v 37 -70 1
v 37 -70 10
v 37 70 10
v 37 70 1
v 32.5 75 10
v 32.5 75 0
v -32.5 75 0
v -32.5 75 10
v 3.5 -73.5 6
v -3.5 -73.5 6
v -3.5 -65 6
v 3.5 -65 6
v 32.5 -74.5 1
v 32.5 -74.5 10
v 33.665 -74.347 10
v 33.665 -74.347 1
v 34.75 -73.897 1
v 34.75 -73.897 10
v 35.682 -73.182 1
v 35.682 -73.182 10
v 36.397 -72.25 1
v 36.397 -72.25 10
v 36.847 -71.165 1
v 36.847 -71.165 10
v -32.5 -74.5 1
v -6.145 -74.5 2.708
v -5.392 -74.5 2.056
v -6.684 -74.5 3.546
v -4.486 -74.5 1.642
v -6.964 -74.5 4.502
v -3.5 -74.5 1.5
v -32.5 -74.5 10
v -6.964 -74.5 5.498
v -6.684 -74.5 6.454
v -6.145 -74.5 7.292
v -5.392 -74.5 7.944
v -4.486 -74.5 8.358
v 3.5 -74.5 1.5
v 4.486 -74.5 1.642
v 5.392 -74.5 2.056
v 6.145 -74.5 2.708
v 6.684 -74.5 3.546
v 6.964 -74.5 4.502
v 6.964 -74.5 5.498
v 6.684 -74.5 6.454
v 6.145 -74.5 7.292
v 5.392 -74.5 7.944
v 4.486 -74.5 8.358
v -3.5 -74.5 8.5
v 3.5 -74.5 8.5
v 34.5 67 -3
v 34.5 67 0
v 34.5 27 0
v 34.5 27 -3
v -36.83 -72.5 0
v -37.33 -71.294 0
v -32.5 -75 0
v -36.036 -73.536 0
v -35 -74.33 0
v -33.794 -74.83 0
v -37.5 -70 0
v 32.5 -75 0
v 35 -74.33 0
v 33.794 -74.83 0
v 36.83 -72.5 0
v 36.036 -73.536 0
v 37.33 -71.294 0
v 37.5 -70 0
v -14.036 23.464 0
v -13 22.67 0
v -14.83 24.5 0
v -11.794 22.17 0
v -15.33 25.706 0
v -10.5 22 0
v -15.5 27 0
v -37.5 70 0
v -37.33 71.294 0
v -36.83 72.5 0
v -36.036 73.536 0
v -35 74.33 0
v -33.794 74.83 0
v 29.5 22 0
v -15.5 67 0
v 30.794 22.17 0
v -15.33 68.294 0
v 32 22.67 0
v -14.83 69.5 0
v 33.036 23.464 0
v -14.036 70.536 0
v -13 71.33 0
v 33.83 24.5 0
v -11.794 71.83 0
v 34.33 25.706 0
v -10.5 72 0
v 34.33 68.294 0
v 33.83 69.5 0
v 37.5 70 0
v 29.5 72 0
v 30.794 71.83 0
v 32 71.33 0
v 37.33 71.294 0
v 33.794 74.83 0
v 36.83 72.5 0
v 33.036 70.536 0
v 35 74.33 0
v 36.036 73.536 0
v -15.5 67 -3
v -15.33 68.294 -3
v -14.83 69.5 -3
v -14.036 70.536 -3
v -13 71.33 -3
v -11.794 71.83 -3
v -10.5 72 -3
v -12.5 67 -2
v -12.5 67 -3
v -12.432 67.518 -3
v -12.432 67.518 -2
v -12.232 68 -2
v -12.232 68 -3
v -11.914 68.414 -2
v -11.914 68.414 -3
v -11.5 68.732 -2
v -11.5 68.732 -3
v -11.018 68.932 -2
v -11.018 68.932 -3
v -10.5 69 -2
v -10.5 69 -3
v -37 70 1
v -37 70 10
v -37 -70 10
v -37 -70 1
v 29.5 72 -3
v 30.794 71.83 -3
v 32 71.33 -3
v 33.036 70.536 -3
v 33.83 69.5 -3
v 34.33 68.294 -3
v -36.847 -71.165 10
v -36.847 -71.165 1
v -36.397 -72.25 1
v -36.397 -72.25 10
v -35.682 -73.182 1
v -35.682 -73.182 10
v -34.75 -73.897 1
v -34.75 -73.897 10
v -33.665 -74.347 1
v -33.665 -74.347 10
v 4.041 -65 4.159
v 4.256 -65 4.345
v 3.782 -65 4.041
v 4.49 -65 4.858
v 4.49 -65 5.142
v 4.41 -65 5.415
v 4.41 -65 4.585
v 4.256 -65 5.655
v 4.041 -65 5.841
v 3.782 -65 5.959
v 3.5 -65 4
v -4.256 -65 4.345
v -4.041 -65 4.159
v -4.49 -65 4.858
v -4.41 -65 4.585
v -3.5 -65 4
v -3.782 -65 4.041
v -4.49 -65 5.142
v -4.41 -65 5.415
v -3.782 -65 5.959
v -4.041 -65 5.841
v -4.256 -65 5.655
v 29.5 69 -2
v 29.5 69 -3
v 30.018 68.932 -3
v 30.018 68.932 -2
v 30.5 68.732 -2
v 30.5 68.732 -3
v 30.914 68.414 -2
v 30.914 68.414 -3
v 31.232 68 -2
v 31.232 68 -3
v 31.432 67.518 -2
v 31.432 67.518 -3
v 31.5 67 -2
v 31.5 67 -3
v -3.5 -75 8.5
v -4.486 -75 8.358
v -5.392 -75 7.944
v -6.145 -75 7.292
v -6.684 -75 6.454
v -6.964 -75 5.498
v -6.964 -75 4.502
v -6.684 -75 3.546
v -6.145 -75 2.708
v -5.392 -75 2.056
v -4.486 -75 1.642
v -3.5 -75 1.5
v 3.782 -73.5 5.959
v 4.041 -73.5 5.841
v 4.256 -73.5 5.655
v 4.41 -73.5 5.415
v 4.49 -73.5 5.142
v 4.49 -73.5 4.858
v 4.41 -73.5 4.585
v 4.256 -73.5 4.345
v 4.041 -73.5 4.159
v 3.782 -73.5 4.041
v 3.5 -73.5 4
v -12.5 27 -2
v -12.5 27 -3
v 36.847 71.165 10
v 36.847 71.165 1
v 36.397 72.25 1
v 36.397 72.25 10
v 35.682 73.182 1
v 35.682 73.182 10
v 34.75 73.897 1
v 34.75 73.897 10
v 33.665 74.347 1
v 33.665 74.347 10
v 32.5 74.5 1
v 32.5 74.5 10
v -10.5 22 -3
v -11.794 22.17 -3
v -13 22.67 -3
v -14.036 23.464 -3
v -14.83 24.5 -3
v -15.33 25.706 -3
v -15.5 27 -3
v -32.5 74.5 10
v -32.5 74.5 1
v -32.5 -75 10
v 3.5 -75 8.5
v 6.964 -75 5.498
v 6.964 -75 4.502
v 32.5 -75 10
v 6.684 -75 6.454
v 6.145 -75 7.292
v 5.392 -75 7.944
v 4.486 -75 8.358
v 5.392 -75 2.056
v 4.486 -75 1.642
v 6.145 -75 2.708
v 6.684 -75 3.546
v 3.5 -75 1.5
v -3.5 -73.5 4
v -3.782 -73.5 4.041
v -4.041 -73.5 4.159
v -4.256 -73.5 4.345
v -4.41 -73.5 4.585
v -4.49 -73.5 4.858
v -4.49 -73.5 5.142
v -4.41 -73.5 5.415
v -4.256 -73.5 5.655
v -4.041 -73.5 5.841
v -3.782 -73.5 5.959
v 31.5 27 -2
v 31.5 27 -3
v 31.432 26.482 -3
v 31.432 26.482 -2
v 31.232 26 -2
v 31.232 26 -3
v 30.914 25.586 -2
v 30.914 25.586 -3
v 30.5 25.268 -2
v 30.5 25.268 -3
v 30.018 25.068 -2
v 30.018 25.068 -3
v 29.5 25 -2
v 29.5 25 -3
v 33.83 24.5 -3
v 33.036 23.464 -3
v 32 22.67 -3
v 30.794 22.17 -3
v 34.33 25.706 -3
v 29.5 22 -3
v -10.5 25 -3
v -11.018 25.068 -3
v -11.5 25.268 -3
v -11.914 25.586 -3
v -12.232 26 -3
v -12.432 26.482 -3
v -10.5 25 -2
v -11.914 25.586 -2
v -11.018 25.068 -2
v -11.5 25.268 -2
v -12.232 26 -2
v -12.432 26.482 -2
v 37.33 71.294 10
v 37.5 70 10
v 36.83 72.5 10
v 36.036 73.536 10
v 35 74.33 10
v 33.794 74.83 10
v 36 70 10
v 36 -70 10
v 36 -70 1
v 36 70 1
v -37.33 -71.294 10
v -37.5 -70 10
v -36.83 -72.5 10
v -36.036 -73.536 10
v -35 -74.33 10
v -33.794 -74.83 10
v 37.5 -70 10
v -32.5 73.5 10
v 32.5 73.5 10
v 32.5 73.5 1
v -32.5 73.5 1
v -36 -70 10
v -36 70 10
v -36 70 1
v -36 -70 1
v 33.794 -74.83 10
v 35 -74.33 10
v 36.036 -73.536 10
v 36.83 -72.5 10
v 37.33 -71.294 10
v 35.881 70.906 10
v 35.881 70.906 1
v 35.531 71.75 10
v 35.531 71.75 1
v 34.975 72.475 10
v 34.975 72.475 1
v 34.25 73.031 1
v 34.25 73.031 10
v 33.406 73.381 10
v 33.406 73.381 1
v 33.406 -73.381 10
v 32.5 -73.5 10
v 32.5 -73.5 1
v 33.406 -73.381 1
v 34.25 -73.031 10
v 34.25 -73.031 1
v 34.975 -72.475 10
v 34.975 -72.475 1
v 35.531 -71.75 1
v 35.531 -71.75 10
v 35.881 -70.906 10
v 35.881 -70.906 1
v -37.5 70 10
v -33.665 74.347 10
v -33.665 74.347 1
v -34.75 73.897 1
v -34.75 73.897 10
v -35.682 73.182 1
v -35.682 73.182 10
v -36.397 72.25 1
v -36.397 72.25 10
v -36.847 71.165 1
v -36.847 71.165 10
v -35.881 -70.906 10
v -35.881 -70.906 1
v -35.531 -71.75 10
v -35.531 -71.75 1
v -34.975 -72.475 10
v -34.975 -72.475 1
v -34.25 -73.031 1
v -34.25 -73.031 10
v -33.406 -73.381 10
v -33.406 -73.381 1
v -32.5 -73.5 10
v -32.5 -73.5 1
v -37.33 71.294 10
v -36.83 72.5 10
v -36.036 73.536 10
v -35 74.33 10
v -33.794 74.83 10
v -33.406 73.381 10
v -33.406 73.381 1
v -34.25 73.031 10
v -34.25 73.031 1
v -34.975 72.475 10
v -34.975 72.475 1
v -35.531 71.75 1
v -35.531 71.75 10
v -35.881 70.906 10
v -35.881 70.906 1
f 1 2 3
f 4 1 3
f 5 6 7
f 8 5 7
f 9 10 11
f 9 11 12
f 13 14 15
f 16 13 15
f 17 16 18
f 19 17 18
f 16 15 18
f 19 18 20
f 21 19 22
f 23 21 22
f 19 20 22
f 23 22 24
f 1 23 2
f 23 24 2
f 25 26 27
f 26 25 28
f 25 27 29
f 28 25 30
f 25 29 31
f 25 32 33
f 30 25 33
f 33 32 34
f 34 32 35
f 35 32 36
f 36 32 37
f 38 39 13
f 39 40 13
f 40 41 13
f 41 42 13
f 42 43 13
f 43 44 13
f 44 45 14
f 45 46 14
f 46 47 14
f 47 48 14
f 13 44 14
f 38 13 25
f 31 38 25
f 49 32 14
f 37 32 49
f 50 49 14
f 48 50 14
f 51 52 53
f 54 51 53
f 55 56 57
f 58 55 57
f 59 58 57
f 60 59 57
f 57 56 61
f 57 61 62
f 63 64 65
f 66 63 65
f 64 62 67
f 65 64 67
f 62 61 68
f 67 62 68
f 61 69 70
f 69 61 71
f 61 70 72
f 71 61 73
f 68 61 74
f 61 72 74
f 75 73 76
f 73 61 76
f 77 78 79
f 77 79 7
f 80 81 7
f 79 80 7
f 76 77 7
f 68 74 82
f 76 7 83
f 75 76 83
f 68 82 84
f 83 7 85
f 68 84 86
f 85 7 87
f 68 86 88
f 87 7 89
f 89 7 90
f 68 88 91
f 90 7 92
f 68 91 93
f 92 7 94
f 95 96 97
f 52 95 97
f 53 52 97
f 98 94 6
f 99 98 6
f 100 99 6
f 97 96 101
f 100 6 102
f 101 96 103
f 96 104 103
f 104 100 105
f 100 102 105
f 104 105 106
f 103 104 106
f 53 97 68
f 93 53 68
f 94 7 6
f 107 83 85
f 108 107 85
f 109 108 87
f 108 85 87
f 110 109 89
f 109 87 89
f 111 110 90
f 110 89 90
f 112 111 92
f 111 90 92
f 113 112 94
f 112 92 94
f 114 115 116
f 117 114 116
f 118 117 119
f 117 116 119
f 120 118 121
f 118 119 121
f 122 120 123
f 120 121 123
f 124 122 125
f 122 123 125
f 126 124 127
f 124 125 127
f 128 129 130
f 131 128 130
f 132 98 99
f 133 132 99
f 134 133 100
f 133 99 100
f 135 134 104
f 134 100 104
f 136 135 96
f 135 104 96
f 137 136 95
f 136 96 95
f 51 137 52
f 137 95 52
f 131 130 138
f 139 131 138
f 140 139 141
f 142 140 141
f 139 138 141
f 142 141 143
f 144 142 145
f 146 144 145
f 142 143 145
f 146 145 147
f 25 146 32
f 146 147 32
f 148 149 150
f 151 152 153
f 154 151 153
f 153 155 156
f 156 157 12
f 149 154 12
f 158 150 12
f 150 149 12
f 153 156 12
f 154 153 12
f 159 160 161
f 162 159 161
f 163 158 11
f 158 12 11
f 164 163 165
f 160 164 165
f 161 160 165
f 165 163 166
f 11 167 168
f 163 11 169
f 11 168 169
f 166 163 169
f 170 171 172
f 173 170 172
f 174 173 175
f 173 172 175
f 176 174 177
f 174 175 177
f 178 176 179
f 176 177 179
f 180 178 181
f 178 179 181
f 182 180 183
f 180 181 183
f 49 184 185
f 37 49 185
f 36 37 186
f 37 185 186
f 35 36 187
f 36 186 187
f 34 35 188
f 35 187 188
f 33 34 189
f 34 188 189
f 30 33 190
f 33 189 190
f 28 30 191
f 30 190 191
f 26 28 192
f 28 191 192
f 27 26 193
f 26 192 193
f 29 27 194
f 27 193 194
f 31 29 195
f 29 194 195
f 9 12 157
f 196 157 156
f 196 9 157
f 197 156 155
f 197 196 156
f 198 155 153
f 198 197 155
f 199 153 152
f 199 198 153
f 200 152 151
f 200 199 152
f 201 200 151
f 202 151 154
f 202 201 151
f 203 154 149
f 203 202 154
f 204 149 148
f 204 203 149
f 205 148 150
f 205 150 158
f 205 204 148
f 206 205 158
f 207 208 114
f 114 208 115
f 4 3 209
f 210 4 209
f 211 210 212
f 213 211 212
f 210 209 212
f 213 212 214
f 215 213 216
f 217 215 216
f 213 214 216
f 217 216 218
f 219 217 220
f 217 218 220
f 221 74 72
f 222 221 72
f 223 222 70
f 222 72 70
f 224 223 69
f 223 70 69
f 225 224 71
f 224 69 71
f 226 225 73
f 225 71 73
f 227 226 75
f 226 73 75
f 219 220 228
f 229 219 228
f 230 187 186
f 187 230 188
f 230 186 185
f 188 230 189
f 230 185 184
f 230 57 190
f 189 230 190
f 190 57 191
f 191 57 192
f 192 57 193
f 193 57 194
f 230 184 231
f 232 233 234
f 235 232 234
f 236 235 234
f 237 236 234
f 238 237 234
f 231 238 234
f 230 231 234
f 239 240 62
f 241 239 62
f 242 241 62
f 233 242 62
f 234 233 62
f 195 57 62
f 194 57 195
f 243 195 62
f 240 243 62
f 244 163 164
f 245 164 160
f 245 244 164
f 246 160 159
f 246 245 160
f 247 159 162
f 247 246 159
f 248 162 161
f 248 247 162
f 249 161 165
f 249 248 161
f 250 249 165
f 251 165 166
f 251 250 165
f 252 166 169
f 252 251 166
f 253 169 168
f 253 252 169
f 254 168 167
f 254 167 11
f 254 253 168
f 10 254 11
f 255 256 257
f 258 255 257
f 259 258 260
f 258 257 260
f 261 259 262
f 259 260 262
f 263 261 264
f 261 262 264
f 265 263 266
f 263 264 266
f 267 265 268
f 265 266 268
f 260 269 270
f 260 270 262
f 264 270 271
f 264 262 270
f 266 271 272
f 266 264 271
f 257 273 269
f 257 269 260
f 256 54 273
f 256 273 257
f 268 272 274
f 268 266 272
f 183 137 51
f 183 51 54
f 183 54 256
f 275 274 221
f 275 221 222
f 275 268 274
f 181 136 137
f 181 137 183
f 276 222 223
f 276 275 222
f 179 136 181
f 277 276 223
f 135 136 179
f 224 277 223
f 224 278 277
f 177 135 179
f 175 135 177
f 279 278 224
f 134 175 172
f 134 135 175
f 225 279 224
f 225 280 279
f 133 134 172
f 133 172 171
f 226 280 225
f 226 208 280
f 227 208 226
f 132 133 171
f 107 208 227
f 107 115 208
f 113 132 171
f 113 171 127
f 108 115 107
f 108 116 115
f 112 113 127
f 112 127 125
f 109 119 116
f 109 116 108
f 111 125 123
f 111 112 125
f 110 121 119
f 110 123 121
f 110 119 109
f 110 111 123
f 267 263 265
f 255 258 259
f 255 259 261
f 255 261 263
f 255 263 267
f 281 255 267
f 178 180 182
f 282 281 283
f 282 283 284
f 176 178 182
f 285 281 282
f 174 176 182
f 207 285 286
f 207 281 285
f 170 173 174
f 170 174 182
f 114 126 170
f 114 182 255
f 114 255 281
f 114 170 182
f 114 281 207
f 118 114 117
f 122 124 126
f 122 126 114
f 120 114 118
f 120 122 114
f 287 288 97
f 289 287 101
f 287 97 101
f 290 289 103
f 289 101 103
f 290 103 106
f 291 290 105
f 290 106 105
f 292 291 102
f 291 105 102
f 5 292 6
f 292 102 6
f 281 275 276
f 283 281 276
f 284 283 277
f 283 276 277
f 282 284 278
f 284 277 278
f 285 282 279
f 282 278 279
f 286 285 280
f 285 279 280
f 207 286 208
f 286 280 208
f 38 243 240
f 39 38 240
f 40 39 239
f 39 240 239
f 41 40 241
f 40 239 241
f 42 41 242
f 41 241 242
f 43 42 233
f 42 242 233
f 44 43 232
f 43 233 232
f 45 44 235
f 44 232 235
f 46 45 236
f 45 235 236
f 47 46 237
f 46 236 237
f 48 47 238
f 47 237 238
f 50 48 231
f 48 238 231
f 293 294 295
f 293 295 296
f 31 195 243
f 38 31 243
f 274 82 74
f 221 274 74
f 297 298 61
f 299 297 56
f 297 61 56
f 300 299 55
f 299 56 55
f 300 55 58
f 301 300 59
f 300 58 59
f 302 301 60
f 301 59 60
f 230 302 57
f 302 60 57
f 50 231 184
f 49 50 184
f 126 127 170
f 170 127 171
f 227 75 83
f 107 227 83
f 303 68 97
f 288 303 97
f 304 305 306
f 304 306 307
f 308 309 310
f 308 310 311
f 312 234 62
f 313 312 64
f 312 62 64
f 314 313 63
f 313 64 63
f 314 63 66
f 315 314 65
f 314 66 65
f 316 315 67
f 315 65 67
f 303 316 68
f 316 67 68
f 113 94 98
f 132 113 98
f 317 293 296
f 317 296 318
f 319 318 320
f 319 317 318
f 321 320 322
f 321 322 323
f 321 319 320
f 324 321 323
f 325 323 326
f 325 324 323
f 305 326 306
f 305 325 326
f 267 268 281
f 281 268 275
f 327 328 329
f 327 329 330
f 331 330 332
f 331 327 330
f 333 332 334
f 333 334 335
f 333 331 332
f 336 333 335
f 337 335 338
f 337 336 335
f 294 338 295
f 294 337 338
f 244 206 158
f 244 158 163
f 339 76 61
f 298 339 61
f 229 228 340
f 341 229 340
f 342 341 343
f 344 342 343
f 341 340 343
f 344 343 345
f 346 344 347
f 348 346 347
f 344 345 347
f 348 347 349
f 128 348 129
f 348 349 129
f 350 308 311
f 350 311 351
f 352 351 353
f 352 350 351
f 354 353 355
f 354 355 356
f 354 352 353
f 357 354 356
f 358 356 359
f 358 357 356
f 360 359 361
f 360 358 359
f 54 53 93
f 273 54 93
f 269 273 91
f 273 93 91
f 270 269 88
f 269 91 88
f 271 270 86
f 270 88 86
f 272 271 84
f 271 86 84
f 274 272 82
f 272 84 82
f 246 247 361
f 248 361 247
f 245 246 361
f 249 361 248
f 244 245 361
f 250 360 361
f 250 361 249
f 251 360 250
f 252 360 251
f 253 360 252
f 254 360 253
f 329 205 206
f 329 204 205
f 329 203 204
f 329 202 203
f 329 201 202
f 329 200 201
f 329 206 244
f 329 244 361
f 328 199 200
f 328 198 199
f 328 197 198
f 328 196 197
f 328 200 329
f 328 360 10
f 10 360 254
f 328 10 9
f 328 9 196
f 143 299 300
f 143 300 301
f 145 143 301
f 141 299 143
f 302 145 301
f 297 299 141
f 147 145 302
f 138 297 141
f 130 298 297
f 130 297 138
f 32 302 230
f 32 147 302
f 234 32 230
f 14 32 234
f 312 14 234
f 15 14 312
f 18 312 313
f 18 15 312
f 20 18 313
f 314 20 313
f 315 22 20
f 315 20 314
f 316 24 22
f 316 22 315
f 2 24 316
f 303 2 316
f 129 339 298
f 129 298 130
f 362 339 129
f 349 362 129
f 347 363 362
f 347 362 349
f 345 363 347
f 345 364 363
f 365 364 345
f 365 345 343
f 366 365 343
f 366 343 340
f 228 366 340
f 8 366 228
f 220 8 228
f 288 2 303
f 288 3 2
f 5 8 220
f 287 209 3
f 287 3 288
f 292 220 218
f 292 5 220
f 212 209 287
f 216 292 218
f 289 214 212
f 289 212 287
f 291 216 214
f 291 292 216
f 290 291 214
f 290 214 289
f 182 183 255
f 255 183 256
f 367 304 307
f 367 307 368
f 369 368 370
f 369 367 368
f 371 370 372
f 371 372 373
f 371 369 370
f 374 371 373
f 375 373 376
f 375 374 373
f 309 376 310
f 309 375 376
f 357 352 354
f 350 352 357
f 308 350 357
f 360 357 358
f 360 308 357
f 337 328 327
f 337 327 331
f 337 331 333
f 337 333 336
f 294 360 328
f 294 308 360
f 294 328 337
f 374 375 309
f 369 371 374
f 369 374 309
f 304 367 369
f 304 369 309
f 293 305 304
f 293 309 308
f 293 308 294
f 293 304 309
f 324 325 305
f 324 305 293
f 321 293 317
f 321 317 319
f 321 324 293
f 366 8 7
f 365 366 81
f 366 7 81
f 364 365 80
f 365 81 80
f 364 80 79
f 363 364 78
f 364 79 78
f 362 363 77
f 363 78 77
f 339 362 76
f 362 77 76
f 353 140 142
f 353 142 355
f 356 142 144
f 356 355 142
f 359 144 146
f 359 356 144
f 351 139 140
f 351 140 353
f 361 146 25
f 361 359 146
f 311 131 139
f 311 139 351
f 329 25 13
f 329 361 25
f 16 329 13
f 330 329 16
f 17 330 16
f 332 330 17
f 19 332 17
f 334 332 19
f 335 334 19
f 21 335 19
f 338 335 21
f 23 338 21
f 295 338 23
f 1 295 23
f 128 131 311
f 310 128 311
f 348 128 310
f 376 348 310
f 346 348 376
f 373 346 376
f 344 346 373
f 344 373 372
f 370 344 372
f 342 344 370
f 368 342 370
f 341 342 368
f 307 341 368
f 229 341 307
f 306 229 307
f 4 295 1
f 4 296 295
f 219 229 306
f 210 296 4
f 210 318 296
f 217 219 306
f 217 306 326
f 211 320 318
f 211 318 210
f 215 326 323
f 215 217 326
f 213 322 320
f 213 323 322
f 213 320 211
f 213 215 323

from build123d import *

# Parameters (mm, degrees)
EXTRUDE_1_DEPTH       = 10
EXTRUDE_2_DEPTH       = 3
CUT_EXTRUDE_1_DEPTH   = 1
CUT_EXTRUDE_1_2_DEPTH = 9
CUT_EXTRUDE_2_DEPTH   = 10
CUT_EXTRUDE_3_REACH   = 156.94


with BuildPart() as part:
    # 草图1 → 凸台-拉伸1 (new body)
    with BuildSketch(Plane.XY):
        with BuildLine():
            Line((-32.5, -75), (32.5, -75))
            ThreePointArc((32.5, -75), (36.035533906, -73.535533906), (37.5, -70))
            Line((37.5, -70), (37.5, 70))
            ThreePointArc((37.5, 70), (36.035533906, 73.535533906), (32.5, 75))
            Line((32.5, 75), (-32.5, 75))
            ThreePointArc((-32.5, 75), (-36.035533906, 73.535533906), (-37.5, 70))
            Line((-37.5, 70), (-37.5, -70))
            ThreePointArc((-37.5, -70), (-36.035533906, -73.535533906), (-32.5, -75))
        make_face()
    extrude(amount=EXTRUDE_1_DEPTH)

    # 草图2 → 凸台-拉伸2 (add)
    with BuildSketch(Plane(origin=(0, 0, 0), x_dir=(-1, 0, 0), z_dir=(0, 0, -1))):
        with BuildLine():
            Line((-29.5, 22), (10.5, 22))
            ThreePointArc((10.5, 22), (14.035533906, 23.464466094), (15.5, 27))
            Line((15.5, 27), (15.5, 67))
            ThreePointArc((15.5, 67), (14.035533906, 70.535533906), (10.5, 72))
            Line((10.5, 72), (-29.5, 72))
            ThreePointArc((-29.5, 72), (-33.035533906, 70.535533906), (-34.5, 67))
            Line((-34.5, 67), (-34.5, 27))
            ThreePointArc((-34.5, 27), (-33.035533906, 23.464466094), (-29.5, 22))
        make_face()
    extrude(amount=EXTRUDE_2_DEPTH)

    # 草图3 → Cut-Extrude 1 (cut)
    with BuildSketch(Plane(origin=(0, 0, -3), x_dir=(-1, 0, 0), z_dir=(0, 0, -1))):
        with BuildLine():
            Line((12.5, 27), (12.5, 67))
            ThreePointArc((12.5, 67), (11.914213562, 68.414213562), (10.5, 69))
            Line((10.5, 69), (-29.5, 69))
            ThreePointArc((-29.5, 69), (-30.914213562, 68.414213562), (-31.5, 67))
            Line((-31.5, 67), (-31.5, 27))
            ThreePointArc((-31.5, 27), (-30.914213562, 25.585786438), (-29.5, 25))
            Line((-29.5, 25), (10.5, 25))
            ThreePointArc((10.5, 25), (11.914213562, 25.585786438), (12.5, 27))
        make_face()
    extrude(amount=-CUT_EXTRUDE_1_DEPTH, mode=Mode.SUBTRACT)

    # 草图5 → Cut-Extrude 1 2 (cut)
    with BuildSketch(Plane.XY.offset(10)):
        with BuildLine():
            Line((-32.5, -74.5), (32.5, -74.5))
            ThreePointArc((32.5, -74.5), (35.681980515, -73.181980515), (37, -70))
            Line((37, -70), (37, 70))
            ThreePointArc((37, 70), (35.681980515, 73.181980515), (32.5, 74.5))
            Line((32.5, 74.5), (-32.5, 74.5))
            ThreePointArc((-32.5, 74.5), (-35.681980515, 73.181980515), (-37, 70))
            Line((-37, 70), (-37, -70))
            ThreePointArc((-37, -70), (-35.681980515, -73.181980515), (-32.5, -74.5))
        make_face()
        with BuildLine():
            Line((-32.5, -73.5), (32.5, -73.5))
            ThreePointArc((32.5, -73.5), (34.974873734, -72.474873734), (36, -70))
            Line((36, -70), (36, 70))
            ThreePointArc((36, 70), (34.974873734, 72.474873734), (32.5, 73.5))
            Line((32.5, 73.5), (-32.5, 73.5))
            ThreePointArc((-32.5, 73.5), (-34.974873734, 72.474873734), (-36, 70))
            Line((-36, 70), (-36, -70))
            ThreePointArc((-36, -70), (-34.974873734, -72.474873734), (-32.5, -73.5))
        make_face(mode=Mode.SUBTRACT)
    extrude(amount=-CUT_EXTRUDE_1_2_DEPTH, mode=Mode.SUBTRACT)

    # 草图6 → 切除-拉伸2 (cut)
    with BuildSketch(Plane.XZ.offset(75)):
        with BuildLine():
            Line((-3.5, 6), (3.5, 6))
            ThreePointArc((3.5, 6), (4.5, 5), (3.5, 4))
            Line((3.5, 4), (-3.5, 4))
            ThreePointArc((-3.5, 4), (-4.5, 5), (-3.5, 6))
        make_face()
    extrude(amount=-CUT_EXTRUDE_2_DEPTH, mode=Mode.SUBTRACT)

    # 草图7 → 切除-拉伸3 (cut, up to next)
    with BuildSketch(Plane.XZ.offset(75), mode=Mode.PRIVATE) as cut_extrude_3_sk1:
        with BuildLine():
            Line((-3.5, 1.5), (3.5, 1.5))
            ThreePointArc((3.5, 1.5), (7, 5), (3.5, 8.5))
            Line((3.5, 8.5), (-3.5, 8.5))
            ThreePointArc((-3.5, 8.5), (-7, 5), (-3.5, 1.5))
        make_face()
    cut_extrude_3_tool1 = extrude(cut_extrude_3_sk1.sketch, amount=-CUT_EXTRUDE_3_REACH, mode=Mode.PRIVATE) & part.part
    add(cut_extrude_3_tool1.solids().sort_by_distance((0, -75, 5))[0], mode=Mode.SUBTRACT)


solid = part.part
